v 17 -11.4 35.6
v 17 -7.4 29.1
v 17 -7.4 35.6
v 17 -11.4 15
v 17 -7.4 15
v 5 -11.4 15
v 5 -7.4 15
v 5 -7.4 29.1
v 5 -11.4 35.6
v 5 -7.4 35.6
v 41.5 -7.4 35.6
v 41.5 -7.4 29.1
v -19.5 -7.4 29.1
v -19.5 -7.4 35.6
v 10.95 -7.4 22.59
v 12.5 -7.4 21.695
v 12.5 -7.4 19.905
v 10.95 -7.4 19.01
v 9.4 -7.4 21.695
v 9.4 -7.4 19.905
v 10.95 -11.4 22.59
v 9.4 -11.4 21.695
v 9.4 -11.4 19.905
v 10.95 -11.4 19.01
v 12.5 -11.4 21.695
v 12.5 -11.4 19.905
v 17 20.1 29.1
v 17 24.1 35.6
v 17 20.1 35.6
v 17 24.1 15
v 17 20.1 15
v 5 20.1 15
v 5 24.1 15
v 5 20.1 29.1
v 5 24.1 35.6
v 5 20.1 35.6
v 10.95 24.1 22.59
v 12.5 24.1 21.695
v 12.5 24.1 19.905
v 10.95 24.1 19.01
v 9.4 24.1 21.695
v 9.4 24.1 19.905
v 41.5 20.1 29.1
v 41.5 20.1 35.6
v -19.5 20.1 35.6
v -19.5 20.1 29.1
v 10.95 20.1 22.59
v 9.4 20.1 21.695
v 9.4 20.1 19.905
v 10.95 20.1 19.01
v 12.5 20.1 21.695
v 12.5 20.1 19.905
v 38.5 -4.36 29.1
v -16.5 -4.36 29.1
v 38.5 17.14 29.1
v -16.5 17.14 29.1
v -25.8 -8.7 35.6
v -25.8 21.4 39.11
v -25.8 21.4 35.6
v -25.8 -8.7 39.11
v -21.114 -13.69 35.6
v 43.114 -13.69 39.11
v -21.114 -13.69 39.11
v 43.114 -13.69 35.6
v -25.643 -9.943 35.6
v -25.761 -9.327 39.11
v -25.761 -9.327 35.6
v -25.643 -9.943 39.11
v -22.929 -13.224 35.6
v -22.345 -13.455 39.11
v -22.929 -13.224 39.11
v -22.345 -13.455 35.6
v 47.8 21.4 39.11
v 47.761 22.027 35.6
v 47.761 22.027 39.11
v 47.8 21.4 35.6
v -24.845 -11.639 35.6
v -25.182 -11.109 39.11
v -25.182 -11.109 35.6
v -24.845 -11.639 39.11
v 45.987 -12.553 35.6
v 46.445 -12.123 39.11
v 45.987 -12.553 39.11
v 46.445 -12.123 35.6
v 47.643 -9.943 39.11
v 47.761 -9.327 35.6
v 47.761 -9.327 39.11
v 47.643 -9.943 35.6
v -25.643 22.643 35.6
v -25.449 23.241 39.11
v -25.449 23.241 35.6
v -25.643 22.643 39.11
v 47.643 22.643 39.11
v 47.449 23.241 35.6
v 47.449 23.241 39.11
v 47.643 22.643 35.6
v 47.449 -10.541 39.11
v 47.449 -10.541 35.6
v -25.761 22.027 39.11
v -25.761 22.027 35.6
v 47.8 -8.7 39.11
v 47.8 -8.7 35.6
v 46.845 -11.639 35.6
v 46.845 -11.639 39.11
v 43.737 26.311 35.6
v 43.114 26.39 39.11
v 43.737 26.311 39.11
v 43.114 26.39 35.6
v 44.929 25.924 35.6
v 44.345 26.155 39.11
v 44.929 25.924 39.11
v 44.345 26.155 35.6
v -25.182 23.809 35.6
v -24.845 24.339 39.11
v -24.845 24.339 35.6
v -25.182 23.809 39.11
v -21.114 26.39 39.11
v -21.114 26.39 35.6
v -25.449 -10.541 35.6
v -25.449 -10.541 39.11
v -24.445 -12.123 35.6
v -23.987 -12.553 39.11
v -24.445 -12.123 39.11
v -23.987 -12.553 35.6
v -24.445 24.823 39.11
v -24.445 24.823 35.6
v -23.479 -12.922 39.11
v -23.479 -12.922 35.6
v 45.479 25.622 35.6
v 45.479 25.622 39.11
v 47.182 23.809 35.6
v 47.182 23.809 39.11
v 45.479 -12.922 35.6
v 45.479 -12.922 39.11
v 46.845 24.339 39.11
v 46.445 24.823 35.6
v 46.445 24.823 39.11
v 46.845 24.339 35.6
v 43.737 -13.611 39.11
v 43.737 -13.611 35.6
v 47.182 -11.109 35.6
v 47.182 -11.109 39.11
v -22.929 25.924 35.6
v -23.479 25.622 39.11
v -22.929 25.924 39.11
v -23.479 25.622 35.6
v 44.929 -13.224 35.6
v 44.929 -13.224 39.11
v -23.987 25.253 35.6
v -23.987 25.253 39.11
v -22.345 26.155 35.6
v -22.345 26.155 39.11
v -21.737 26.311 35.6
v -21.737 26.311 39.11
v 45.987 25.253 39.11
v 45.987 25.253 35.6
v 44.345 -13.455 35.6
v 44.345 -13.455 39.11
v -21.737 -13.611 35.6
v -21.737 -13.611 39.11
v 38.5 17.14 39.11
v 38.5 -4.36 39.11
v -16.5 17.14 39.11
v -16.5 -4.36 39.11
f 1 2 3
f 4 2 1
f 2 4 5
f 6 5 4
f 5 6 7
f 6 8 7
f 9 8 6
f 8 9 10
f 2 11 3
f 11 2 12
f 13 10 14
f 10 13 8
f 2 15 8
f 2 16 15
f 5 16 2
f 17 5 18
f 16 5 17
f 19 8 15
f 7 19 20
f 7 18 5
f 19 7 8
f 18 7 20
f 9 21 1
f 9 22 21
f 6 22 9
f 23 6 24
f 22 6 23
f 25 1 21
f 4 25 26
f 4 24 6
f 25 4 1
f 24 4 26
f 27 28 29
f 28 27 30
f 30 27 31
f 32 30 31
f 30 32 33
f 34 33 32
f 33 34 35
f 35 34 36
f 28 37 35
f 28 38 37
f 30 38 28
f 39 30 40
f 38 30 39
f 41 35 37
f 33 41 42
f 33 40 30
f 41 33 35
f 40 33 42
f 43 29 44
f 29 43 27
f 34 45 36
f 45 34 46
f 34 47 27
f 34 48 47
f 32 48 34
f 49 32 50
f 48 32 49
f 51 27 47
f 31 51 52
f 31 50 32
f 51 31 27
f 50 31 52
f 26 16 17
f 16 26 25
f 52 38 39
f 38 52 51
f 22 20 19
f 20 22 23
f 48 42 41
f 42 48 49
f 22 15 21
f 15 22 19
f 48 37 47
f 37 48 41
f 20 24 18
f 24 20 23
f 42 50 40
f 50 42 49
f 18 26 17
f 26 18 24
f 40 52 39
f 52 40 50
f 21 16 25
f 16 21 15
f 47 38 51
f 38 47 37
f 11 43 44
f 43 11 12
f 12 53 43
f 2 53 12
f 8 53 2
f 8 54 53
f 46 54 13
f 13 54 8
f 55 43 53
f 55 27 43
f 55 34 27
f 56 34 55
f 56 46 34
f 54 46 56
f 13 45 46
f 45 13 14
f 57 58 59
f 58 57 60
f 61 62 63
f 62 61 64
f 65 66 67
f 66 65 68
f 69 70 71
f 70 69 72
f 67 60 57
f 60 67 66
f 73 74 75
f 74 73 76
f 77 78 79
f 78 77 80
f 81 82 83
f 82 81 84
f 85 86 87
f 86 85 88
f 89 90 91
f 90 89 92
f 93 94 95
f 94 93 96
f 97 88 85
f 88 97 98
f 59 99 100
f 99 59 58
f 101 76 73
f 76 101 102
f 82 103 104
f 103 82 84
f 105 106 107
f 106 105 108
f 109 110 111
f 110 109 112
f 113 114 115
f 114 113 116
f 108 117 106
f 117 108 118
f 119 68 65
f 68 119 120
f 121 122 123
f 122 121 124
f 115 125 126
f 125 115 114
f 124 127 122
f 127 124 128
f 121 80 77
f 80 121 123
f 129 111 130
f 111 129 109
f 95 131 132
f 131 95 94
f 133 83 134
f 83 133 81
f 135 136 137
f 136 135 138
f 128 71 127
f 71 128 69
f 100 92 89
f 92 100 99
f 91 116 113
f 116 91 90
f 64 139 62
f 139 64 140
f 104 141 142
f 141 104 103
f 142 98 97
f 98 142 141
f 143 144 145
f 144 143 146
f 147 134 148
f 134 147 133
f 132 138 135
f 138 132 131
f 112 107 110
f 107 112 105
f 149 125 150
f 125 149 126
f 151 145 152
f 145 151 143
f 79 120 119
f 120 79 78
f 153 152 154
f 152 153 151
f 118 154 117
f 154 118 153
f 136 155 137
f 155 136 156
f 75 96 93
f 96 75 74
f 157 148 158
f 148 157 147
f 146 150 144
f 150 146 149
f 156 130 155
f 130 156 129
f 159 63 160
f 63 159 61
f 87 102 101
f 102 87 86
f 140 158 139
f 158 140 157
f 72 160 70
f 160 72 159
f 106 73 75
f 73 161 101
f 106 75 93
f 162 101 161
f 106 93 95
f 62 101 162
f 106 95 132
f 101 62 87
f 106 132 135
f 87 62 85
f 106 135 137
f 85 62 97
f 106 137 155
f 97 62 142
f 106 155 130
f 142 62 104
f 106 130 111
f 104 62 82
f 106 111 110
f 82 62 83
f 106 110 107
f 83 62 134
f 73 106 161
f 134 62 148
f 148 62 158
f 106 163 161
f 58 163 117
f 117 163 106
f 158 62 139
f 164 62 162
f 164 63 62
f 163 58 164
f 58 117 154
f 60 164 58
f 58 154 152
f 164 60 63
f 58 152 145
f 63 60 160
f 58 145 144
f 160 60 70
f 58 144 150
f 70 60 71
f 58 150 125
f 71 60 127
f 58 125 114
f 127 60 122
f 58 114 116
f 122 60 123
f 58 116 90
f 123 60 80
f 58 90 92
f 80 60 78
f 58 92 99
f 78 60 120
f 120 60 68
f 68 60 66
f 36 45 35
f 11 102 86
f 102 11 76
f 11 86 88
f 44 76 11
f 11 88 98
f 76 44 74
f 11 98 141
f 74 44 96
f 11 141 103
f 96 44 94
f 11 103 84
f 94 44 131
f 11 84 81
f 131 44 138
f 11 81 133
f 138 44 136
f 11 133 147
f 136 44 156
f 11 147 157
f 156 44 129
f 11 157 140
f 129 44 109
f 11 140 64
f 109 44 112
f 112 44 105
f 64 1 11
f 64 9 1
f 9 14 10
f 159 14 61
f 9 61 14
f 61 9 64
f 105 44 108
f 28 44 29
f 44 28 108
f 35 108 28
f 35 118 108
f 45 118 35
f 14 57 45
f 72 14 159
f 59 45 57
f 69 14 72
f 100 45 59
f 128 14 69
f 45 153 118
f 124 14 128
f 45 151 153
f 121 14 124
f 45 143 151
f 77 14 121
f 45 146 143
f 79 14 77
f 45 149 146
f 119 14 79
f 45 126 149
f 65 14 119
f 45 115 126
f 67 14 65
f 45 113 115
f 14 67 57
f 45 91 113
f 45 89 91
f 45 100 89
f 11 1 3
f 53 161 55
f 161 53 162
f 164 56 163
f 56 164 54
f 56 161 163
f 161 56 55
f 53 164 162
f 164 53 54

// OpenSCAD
module polyhole(h, d) {
    n = max(round(2 * d),3);
    rotate([0,0,180])
        cylinder(h = h, r = (d / 2) / cos (180 / n), $fn = n);
}

/* bezel */
difference() {
    union() {
        /* outer */
        translate([-19.5,-7.4,29.1]) color("burlywood") {
            cube([61,27.5,10]);
        }
        /* flange */
        minkowski() {
            translate([-20.8,-8.7,35.6]) color("burlywood") {
                cube([63.6,30.1,3.5]);
            }
            $fn=50;
            cylinder(r=5, h=0.01);
        }
        /* descenders */
        difference() {
            union() {
                translate([5,-11.4,15]) {
                    cube([12,4,21]);
                }
                translate([5,20.1,15]) {
                    cube([12,4,21]);
                }
            }
            translate([10.95,32,20.8]) {
                /* rod hole */
                rotate(a=[90,90,0]) {
                    polyhole(h = 62, d = 3.1);
                }
            }
        }
    }
    /* inner */
    translate([-16.5,-4.36,27.0]) {
        cube([55,21.5,29.6]);
    }
}
